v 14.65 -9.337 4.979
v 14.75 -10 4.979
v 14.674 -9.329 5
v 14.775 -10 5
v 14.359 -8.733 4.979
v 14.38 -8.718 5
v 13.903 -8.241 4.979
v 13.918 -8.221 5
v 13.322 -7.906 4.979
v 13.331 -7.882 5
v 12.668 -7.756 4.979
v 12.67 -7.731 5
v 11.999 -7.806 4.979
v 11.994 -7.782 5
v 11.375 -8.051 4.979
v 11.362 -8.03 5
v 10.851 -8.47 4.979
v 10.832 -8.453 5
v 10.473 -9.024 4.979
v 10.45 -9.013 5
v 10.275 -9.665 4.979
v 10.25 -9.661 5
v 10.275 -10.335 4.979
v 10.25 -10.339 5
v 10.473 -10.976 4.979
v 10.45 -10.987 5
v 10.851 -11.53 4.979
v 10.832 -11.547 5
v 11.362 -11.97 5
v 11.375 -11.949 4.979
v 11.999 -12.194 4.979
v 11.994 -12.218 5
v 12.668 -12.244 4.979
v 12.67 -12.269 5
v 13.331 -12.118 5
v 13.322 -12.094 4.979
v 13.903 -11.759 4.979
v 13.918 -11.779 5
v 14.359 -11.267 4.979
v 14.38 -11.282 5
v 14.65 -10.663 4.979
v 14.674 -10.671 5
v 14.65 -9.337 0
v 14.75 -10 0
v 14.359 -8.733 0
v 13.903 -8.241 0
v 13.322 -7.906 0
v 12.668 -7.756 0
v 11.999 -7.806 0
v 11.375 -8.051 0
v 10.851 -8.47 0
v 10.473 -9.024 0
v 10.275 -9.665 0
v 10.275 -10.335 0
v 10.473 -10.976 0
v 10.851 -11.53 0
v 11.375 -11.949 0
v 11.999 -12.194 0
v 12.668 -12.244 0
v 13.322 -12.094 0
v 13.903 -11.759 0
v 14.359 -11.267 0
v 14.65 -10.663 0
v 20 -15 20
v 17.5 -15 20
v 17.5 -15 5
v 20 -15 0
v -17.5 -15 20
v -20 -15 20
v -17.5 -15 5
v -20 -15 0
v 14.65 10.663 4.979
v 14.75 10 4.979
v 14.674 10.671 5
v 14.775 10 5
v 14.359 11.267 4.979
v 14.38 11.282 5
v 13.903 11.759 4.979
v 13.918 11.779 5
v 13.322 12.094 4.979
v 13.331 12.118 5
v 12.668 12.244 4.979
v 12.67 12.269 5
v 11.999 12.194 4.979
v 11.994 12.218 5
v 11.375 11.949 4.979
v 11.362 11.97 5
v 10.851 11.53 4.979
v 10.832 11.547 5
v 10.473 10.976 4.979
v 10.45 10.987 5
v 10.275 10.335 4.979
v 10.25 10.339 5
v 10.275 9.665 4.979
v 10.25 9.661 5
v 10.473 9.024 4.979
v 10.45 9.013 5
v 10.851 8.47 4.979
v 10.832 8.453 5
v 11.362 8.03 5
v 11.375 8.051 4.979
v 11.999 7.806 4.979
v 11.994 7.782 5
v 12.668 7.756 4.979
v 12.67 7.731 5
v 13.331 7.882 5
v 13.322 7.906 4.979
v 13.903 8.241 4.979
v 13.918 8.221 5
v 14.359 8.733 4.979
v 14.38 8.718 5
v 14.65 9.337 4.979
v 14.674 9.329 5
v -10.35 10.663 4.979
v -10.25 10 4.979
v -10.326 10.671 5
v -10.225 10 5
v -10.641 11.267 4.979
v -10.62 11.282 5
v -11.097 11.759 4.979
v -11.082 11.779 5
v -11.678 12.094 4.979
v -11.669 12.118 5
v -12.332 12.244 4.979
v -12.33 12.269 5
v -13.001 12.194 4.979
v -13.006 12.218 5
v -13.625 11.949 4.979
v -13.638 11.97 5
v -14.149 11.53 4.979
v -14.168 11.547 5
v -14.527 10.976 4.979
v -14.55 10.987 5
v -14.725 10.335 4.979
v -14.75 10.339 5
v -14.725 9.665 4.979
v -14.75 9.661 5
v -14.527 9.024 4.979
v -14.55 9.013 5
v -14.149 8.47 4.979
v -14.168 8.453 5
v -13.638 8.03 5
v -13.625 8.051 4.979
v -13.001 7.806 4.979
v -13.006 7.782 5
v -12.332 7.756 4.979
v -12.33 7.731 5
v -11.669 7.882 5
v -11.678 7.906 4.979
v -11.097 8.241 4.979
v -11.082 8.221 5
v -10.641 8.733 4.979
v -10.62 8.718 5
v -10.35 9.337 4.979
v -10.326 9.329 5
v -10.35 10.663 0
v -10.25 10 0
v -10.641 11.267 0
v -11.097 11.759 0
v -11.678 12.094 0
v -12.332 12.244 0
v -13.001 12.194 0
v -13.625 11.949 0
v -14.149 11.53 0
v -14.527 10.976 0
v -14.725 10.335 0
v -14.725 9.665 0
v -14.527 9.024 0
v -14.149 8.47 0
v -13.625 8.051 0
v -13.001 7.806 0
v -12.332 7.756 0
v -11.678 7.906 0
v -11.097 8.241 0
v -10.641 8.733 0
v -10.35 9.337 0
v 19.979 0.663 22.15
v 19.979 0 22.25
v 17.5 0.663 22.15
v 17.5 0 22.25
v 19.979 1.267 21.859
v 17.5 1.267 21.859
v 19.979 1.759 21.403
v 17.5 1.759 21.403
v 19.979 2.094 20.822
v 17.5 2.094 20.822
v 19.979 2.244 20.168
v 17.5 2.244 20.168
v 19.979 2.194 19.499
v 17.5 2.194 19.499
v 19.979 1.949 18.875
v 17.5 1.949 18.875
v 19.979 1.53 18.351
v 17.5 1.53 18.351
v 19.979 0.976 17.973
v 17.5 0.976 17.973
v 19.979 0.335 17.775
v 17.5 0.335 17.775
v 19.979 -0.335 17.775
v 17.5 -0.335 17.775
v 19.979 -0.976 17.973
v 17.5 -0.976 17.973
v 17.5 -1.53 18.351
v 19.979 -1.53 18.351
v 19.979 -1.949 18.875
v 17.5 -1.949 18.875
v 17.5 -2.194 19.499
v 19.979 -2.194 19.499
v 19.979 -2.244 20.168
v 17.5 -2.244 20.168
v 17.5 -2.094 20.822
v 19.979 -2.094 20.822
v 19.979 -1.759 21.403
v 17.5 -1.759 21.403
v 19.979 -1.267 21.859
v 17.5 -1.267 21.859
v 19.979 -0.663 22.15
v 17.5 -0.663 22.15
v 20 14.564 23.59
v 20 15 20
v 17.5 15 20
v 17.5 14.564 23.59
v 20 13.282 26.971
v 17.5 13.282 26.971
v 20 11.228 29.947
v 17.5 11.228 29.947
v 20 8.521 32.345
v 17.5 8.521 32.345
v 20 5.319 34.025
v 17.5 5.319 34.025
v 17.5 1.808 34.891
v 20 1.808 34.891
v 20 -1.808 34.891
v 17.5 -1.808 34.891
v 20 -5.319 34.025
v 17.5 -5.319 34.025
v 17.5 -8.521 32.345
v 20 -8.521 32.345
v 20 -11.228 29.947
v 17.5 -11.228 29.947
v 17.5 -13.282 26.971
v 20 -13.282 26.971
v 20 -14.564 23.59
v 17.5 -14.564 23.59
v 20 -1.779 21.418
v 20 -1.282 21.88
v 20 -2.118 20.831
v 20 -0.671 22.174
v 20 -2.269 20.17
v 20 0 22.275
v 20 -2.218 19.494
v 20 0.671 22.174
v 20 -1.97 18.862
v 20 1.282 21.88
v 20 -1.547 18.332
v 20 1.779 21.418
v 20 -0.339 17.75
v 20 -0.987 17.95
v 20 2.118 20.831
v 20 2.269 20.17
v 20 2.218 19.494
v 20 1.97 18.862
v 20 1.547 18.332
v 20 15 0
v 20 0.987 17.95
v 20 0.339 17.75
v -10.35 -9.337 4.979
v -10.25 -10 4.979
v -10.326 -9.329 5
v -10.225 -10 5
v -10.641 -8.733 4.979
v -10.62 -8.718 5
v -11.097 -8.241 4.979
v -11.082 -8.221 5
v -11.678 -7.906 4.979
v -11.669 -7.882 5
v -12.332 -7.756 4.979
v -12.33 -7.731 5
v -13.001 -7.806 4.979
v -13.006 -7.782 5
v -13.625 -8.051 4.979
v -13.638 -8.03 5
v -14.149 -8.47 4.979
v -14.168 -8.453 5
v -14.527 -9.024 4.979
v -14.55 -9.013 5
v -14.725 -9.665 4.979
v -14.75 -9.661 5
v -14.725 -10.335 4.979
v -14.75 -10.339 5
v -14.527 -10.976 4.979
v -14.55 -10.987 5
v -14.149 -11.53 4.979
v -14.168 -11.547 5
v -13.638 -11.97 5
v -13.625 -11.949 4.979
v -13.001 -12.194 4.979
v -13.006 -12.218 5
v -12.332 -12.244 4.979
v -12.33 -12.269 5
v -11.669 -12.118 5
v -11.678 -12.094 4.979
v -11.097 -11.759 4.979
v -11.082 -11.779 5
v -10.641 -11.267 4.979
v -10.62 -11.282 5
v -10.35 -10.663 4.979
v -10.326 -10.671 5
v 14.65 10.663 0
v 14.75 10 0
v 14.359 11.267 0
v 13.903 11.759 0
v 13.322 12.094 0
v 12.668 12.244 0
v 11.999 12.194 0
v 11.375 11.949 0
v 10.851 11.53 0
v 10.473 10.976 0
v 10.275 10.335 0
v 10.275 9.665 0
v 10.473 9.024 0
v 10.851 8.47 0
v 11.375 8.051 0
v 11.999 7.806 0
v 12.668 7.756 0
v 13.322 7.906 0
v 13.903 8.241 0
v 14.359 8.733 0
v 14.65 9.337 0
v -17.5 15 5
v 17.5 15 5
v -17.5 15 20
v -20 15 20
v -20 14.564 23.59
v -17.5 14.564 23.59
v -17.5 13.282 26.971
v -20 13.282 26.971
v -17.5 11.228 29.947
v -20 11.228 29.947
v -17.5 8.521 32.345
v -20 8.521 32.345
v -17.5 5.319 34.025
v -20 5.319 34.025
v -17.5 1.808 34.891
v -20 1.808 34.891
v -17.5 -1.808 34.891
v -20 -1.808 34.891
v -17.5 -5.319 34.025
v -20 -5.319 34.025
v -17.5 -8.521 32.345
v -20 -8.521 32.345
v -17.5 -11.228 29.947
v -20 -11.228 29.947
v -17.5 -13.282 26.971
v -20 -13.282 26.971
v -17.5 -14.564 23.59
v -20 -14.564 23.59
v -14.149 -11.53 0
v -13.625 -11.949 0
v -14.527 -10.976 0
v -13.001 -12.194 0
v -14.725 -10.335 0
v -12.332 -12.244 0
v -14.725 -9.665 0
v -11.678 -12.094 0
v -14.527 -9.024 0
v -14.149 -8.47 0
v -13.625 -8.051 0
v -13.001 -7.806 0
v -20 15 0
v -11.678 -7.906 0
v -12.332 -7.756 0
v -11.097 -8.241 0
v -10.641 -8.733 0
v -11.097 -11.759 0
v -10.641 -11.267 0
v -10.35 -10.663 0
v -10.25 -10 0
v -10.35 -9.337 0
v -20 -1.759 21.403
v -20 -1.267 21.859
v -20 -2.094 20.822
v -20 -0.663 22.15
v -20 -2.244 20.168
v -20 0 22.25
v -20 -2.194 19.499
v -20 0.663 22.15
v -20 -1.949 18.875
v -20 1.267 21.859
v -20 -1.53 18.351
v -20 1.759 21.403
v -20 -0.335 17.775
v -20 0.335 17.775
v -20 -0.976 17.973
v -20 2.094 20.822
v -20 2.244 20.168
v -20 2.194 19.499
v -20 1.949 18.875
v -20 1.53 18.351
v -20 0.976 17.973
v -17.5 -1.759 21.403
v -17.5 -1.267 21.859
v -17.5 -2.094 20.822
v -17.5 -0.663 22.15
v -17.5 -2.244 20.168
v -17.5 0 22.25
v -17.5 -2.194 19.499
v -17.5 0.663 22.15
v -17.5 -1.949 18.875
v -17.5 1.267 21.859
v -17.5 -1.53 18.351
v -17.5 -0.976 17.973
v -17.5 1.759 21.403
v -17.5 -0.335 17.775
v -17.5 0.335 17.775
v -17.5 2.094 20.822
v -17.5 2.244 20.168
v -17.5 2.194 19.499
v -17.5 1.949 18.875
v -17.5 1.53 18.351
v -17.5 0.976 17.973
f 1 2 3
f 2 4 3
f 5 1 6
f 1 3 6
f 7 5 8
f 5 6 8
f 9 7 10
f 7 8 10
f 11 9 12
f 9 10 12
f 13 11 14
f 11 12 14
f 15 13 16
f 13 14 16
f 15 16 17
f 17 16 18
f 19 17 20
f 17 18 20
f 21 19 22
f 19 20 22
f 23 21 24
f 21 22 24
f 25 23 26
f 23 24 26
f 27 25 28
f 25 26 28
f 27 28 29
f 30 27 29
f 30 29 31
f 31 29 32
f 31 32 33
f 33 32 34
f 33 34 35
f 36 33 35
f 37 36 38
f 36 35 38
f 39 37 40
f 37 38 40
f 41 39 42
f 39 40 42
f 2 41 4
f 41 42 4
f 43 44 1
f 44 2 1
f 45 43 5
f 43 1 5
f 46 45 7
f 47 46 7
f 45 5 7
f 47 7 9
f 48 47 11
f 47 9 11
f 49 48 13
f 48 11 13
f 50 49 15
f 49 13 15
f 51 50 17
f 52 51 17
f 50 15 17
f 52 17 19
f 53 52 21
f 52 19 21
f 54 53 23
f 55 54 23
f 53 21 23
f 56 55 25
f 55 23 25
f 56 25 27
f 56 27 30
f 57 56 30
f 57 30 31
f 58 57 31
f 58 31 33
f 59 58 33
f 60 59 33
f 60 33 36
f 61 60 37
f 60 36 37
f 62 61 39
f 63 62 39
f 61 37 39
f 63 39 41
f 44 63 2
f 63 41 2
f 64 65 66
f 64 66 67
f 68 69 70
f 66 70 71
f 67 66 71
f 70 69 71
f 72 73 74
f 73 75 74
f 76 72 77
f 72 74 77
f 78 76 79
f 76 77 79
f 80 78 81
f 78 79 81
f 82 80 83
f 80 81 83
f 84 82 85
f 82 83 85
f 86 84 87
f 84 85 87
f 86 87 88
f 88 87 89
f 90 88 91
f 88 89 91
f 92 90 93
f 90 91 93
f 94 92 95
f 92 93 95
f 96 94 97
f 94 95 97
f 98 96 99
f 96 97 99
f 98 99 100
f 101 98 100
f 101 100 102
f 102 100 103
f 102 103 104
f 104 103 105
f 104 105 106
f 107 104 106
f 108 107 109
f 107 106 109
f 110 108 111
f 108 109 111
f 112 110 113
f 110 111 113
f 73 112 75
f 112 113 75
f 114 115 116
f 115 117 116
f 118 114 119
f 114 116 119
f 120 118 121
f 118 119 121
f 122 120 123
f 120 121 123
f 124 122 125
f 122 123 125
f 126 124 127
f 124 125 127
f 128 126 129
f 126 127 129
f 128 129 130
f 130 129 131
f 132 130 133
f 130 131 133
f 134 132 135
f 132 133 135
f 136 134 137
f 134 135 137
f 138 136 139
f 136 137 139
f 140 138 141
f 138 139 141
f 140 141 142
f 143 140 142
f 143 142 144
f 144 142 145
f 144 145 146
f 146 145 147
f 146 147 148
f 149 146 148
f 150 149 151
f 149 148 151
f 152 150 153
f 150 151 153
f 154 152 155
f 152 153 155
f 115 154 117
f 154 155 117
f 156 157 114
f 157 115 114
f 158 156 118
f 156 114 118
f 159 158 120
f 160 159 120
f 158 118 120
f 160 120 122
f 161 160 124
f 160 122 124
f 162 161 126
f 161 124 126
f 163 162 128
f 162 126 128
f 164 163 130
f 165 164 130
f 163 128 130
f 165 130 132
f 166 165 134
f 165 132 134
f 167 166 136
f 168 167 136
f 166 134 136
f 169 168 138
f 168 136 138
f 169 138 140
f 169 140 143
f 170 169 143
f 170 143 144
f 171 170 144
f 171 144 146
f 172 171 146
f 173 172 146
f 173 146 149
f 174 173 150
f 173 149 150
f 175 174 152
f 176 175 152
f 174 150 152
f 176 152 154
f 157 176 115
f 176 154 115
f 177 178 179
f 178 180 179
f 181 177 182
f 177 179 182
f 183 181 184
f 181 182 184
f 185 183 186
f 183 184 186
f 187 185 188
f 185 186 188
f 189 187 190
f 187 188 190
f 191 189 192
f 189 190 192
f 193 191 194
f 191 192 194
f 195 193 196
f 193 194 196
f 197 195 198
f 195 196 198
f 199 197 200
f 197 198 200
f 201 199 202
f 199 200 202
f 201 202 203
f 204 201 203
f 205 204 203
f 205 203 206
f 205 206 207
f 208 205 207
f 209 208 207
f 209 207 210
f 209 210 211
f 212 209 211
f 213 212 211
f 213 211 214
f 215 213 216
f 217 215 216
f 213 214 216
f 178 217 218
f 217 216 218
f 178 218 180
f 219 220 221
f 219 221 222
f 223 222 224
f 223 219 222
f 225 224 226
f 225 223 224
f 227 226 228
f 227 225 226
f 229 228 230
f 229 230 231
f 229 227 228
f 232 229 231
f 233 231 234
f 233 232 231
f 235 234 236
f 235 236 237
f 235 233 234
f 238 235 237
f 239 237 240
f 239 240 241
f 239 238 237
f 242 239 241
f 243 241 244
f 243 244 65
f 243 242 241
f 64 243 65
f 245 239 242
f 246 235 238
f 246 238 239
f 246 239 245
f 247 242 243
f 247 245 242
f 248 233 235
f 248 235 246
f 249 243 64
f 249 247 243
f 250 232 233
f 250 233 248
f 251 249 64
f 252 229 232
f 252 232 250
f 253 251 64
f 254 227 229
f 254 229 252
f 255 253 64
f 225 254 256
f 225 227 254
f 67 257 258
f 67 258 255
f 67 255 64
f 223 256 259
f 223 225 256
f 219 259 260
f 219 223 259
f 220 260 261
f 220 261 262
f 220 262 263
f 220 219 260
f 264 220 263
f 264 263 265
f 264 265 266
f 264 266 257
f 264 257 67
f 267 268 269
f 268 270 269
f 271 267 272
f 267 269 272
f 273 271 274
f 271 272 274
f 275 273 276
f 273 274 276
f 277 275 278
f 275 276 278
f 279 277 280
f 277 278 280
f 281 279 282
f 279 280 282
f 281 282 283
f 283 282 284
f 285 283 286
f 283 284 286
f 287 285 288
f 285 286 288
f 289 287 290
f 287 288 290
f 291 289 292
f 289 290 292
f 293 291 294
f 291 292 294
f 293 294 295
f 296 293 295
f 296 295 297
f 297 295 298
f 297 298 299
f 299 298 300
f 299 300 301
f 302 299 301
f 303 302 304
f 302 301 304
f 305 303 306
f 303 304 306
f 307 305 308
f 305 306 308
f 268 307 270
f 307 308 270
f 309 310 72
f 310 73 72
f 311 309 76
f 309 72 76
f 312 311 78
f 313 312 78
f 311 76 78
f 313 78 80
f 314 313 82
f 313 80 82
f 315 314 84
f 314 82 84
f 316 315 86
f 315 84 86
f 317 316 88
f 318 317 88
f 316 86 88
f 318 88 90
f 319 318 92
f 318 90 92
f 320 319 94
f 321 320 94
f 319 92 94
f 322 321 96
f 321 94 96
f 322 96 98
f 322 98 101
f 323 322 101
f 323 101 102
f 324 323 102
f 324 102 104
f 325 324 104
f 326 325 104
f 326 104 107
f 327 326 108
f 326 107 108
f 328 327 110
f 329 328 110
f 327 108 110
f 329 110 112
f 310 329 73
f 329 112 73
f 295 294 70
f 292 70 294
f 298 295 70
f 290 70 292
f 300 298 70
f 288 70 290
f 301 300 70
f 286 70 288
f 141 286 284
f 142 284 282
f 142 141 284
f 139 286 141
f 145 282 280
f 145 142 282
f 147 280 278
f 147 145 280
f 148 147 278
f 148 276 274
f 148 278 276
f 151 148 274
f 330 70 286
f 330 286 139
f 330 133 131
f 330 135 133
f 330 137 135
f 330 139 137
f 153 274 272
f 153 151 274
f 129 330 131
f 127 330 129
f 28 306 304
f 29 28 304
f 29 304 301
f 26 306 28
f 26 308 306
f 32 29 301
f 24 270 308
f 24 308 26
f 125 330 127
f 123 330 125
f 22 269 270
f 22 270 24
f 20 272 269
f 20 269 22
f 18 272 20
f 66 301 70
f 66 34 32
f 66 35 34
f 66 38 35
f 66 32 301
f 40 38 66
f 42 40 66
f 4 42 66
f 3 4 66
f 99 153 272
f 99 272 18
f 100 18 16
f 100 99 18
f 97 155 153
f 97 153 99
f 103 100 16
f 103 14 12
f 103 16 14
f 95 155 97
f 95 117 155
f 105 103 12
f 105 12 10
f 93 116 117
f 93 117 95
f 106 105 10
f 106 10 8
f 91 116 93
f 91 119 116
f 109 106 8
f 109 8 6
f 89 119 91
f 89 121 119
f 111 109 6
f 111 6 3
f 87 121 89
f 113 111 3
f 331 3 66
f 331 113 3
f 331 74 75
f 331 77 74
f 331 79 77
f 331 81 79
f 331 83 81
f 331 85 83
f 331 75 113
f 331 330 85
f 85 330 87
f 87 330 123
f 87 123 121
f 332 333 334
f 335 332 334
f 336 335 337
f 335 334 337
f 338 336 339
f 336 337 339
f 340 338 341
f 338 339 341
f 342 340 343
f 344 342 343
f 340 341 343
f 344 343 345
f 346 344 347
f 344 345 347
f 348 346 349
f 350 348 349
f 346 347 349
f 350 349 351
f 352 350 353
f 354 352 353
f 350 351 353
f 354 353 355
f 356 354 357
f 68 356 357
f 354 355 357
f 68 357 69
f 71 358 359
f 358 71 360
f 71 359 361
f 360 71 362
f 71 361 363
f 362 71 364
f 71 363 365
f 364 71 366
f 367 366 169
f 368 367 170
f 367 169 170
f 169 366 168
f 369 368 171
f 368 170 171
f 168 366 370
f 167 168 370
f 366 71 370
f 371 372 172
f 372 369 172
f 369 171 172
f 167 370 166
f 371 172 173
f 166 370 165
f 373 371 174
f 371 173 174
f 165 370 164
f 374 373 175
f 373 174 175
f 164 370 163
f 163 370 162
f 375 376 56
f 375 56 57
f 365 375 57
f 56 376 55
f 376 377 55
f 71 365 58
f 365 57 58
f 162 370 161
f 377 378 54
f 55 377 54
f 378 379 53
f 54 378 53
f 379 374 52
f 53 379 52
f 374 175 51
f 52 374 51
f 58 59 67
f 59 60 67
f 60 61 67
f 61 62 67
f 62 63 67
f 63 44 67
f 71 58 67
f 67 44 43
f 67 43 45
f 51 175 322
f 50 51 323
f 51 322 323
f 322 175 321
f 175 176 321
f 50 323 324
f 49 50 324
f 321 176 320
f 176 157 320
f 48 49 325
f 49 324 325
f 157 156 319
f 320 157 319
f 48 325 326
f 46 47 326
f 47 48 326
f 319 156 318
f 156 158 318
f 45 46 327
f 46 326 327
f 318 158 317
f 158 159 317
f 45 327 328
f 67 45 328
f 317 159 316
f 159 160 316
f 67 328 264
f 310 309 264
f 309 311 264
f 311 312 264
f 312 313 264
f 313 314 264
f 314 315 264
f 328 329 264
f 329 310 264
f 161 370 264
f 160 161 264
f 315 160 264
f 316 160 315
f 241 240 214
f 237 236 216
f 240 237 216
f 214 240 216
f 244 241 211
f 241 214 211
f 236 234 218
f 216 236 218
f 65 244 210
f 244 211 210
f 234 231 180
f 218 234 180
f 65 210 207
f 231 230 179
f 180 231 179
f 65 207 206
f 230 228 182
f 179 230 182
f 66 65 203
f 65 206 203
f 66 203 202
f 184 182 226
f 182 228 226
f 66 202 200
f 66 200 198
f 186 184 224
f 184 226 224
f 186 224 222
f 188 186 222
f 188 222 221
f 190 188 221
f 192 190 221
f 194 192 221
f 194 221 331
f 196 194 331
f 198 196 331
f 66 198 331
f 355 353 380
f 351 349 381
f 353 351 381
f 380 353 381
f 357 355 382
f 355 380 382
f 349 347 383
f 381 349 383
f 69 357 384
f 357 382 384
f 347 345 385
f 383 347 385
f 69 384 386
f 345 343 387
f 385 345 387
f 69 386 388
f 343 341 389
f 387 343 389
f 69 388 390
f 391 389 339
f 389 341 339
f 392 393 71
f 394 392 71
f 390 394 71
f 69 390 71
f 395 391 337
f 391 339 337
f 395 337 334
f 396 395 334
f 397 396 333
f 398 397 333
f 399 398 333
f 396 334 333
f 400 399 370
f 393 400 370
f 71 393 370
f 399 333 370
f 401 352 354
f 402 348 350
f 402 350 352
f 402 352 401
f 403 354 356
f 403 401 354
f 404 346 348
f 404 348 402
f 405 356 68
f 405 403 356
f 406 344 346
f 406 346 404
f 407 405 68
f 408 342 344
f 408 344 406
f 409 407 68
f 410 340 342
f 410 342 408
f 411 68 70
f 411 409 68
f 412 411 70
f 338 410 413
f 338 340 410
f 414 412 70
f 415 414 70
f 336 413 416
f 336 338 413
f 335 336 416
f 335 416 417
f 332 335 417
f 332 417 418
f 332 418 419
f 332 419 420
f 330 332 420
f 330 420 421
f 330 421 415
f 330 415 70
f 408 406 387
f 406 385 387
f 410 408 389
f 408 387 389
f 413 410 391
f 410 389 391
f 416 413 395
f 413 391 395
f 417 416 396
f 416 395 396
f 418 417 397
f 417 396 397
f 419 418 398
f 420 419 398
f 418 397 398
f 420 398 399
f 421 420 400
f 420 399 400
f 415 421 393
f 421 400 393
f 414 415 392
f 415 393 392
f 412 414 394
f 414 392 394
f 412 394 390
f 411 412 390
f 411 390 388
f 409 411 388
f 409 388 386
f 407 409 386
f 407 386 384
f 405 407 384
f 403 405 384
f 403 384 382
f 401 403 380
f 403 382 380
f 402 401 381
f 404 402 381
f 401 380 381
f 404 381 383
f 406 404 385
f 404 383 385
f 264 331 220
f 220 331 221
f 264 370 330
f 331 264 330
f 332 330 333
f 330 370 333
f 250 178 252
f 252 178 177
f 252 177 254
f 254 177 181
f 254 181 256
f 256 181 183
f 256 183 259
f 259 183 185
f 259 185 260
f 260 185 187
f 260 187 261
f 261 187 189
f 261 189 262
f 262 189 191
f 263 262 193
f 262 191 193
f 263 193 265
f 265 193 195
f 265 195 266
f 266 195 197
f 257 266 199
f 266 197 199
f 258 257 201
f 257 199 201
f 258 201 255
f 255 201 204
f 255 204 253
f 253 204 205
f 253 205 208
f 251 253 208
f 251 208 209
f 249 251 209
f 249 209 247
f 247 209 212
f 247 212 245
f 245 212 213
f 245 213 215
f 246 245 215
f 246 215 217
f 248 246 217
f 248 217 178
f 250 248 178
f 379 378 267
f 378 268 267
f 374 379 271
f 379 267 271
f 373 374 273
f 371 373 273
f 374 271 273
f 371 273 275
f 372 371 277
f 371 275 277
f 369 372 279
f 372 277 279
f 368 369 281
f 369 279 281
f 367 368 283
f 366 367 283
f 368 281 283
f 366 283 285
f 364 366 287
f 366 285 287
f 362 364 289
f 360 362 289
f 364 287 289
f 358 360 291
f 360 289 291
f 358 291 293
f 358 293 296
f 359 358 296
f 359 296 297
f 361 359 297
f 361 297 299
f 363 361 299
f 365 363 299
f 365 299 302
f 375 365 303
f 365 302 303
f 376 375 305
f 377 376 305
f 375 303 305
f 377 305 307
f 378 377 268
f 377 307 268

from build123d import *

# Parameters (mm, degrees)
SKETCH1_W                      = 40
SKETCH1_H                      = 30
BOSS_EXTRUDE1_DEPTH            = 5
BOSS_EXTRUDE2_DEPTH            = 2.5
M4_CLEARANCE_HOLE2_D           = 4.5
M4_CLEARANCE_HOLE2_CSINK_D     = 4.55
M4_CLEARANCE_HOLE2_CSINK_ANGLE = 100


# Read off the part's stored shape, not the designer's step: M4 Clearance Hole1
with BuildPart() as part:
    # Sketch1 → Boss-Extrude1 (new body)
    with BuildSketch(Plane.XY):
        Rectangle(SKETCH1_W, SKETCH1_H)
    extrude(amount=BOSS_EXTRUDE1_DEPTH)

    # Sketch2 → Boss-Extrude2 (add)
    with BuildSketch(Plane(origin=(20, 0, 0), x_dir=(0, 0, -1), z_dir=(1, 0, 0))):
        with BuildLine():
            Line((-5, -15), (-5, 15))
            Line((-5, 15), (-20, 15))
            ThreePointArc((-20, 15), (-35, 0), (-20, -15))
            Line((-20, -15), (-5, -15))
        make_face()
    boss_extrude2 = extrude(amount=-BOSS_EXTRUDE2_DEPTH)

    # Mirror1: Boss-Extrude2 across plane
    add(boss_extrude2.mirror(Plane(origin=(0, 0, 0), x_dir=(0, 0, 1), z_dir=(1, 0, 0))))

    # M4 Clearance Hole1 outline → M4 Clearance Hole1 (revolve, cut)
    with BuildSketch(Plane(origin=(12.5, 10, 0), x_dir=(1, 0, 0), z_dir=(0, -1, 0))):
        Polygon((0, 0), (2.25, 0), (2.25, 4.979022509), (2.275, 5), (0, 5), align=None)
    revolve(axis=Axis((12.5, 10, 0), (0, 0, 1)), mode=Mode.SUBTRACT)

    # M4 Clearance Hole1 2 outline → M4 Clearance Hole1 2 (revolve, cut)
    with BuildSketch(Plane(origin=(-12.5, -10, 0), x_dir=(1, 0, 0), z_dir=(0, -1, 0))):
        Polygon((0, 0), (2.25, 0), (2.25, 4.979022509), (2.275, 5), (0, 5), align=None)
    revolve(axis=Axis((-12.5, -10, 0), (0, 0, 1)), mode=Mode.SUBTRACT)

    # M4 Clearance Hole1 3 outline → M4 Clearance Hole1 3 (revolve, cut)
    with BuildSketch(Plane(origin=(12.5, -10, 0), x_dir=(1, 0, 0), z_dir=(0, -1, 0))):
        Polygon((0, 0), (2.25, 0), (2.25, 4.979022509), (2.275, 5), (0, 5), align=None)
    revolve(axis=Axis((12.5, -10, 0), (0, 0, 1)), mode=Mode.SUBTRACT)

    # M4 Clearance Hole1 4 outline → M4 Clearance Hole1 4 (revolve, cut)
    with BuildSketch(Plane(origin=(-12.5, 10, 0), x_dir=(1, 0, 0), z_dir=(0, -1, 0))):
        Polygon((0, 0), (2.25, 0), (2.25, 4.979022509), (2.275, 5), (0, 5), align=None)
    revolve(axis=Axis((-12.5, 10, 0), (0, 0, 1)), mode=Mode.SUBTRACT)

    # M4 Clearance Hole2 (through all)
    with Locations(Plane(origin=(20, 0, 0), x_dir=(0, 0, -1), z_dir=(1, 0, 0))):
        with Locations((-20, 0)):
            CounterSinkHole(M4_CLEARANCE_HOLE2_D / 2, M4_CLEARANCE_HOLE2_CSINK_D / 2, counter_sink_angle=M4_CLEARANCE_HOLE2_CSINK_ANGLE)


solid = part.part
